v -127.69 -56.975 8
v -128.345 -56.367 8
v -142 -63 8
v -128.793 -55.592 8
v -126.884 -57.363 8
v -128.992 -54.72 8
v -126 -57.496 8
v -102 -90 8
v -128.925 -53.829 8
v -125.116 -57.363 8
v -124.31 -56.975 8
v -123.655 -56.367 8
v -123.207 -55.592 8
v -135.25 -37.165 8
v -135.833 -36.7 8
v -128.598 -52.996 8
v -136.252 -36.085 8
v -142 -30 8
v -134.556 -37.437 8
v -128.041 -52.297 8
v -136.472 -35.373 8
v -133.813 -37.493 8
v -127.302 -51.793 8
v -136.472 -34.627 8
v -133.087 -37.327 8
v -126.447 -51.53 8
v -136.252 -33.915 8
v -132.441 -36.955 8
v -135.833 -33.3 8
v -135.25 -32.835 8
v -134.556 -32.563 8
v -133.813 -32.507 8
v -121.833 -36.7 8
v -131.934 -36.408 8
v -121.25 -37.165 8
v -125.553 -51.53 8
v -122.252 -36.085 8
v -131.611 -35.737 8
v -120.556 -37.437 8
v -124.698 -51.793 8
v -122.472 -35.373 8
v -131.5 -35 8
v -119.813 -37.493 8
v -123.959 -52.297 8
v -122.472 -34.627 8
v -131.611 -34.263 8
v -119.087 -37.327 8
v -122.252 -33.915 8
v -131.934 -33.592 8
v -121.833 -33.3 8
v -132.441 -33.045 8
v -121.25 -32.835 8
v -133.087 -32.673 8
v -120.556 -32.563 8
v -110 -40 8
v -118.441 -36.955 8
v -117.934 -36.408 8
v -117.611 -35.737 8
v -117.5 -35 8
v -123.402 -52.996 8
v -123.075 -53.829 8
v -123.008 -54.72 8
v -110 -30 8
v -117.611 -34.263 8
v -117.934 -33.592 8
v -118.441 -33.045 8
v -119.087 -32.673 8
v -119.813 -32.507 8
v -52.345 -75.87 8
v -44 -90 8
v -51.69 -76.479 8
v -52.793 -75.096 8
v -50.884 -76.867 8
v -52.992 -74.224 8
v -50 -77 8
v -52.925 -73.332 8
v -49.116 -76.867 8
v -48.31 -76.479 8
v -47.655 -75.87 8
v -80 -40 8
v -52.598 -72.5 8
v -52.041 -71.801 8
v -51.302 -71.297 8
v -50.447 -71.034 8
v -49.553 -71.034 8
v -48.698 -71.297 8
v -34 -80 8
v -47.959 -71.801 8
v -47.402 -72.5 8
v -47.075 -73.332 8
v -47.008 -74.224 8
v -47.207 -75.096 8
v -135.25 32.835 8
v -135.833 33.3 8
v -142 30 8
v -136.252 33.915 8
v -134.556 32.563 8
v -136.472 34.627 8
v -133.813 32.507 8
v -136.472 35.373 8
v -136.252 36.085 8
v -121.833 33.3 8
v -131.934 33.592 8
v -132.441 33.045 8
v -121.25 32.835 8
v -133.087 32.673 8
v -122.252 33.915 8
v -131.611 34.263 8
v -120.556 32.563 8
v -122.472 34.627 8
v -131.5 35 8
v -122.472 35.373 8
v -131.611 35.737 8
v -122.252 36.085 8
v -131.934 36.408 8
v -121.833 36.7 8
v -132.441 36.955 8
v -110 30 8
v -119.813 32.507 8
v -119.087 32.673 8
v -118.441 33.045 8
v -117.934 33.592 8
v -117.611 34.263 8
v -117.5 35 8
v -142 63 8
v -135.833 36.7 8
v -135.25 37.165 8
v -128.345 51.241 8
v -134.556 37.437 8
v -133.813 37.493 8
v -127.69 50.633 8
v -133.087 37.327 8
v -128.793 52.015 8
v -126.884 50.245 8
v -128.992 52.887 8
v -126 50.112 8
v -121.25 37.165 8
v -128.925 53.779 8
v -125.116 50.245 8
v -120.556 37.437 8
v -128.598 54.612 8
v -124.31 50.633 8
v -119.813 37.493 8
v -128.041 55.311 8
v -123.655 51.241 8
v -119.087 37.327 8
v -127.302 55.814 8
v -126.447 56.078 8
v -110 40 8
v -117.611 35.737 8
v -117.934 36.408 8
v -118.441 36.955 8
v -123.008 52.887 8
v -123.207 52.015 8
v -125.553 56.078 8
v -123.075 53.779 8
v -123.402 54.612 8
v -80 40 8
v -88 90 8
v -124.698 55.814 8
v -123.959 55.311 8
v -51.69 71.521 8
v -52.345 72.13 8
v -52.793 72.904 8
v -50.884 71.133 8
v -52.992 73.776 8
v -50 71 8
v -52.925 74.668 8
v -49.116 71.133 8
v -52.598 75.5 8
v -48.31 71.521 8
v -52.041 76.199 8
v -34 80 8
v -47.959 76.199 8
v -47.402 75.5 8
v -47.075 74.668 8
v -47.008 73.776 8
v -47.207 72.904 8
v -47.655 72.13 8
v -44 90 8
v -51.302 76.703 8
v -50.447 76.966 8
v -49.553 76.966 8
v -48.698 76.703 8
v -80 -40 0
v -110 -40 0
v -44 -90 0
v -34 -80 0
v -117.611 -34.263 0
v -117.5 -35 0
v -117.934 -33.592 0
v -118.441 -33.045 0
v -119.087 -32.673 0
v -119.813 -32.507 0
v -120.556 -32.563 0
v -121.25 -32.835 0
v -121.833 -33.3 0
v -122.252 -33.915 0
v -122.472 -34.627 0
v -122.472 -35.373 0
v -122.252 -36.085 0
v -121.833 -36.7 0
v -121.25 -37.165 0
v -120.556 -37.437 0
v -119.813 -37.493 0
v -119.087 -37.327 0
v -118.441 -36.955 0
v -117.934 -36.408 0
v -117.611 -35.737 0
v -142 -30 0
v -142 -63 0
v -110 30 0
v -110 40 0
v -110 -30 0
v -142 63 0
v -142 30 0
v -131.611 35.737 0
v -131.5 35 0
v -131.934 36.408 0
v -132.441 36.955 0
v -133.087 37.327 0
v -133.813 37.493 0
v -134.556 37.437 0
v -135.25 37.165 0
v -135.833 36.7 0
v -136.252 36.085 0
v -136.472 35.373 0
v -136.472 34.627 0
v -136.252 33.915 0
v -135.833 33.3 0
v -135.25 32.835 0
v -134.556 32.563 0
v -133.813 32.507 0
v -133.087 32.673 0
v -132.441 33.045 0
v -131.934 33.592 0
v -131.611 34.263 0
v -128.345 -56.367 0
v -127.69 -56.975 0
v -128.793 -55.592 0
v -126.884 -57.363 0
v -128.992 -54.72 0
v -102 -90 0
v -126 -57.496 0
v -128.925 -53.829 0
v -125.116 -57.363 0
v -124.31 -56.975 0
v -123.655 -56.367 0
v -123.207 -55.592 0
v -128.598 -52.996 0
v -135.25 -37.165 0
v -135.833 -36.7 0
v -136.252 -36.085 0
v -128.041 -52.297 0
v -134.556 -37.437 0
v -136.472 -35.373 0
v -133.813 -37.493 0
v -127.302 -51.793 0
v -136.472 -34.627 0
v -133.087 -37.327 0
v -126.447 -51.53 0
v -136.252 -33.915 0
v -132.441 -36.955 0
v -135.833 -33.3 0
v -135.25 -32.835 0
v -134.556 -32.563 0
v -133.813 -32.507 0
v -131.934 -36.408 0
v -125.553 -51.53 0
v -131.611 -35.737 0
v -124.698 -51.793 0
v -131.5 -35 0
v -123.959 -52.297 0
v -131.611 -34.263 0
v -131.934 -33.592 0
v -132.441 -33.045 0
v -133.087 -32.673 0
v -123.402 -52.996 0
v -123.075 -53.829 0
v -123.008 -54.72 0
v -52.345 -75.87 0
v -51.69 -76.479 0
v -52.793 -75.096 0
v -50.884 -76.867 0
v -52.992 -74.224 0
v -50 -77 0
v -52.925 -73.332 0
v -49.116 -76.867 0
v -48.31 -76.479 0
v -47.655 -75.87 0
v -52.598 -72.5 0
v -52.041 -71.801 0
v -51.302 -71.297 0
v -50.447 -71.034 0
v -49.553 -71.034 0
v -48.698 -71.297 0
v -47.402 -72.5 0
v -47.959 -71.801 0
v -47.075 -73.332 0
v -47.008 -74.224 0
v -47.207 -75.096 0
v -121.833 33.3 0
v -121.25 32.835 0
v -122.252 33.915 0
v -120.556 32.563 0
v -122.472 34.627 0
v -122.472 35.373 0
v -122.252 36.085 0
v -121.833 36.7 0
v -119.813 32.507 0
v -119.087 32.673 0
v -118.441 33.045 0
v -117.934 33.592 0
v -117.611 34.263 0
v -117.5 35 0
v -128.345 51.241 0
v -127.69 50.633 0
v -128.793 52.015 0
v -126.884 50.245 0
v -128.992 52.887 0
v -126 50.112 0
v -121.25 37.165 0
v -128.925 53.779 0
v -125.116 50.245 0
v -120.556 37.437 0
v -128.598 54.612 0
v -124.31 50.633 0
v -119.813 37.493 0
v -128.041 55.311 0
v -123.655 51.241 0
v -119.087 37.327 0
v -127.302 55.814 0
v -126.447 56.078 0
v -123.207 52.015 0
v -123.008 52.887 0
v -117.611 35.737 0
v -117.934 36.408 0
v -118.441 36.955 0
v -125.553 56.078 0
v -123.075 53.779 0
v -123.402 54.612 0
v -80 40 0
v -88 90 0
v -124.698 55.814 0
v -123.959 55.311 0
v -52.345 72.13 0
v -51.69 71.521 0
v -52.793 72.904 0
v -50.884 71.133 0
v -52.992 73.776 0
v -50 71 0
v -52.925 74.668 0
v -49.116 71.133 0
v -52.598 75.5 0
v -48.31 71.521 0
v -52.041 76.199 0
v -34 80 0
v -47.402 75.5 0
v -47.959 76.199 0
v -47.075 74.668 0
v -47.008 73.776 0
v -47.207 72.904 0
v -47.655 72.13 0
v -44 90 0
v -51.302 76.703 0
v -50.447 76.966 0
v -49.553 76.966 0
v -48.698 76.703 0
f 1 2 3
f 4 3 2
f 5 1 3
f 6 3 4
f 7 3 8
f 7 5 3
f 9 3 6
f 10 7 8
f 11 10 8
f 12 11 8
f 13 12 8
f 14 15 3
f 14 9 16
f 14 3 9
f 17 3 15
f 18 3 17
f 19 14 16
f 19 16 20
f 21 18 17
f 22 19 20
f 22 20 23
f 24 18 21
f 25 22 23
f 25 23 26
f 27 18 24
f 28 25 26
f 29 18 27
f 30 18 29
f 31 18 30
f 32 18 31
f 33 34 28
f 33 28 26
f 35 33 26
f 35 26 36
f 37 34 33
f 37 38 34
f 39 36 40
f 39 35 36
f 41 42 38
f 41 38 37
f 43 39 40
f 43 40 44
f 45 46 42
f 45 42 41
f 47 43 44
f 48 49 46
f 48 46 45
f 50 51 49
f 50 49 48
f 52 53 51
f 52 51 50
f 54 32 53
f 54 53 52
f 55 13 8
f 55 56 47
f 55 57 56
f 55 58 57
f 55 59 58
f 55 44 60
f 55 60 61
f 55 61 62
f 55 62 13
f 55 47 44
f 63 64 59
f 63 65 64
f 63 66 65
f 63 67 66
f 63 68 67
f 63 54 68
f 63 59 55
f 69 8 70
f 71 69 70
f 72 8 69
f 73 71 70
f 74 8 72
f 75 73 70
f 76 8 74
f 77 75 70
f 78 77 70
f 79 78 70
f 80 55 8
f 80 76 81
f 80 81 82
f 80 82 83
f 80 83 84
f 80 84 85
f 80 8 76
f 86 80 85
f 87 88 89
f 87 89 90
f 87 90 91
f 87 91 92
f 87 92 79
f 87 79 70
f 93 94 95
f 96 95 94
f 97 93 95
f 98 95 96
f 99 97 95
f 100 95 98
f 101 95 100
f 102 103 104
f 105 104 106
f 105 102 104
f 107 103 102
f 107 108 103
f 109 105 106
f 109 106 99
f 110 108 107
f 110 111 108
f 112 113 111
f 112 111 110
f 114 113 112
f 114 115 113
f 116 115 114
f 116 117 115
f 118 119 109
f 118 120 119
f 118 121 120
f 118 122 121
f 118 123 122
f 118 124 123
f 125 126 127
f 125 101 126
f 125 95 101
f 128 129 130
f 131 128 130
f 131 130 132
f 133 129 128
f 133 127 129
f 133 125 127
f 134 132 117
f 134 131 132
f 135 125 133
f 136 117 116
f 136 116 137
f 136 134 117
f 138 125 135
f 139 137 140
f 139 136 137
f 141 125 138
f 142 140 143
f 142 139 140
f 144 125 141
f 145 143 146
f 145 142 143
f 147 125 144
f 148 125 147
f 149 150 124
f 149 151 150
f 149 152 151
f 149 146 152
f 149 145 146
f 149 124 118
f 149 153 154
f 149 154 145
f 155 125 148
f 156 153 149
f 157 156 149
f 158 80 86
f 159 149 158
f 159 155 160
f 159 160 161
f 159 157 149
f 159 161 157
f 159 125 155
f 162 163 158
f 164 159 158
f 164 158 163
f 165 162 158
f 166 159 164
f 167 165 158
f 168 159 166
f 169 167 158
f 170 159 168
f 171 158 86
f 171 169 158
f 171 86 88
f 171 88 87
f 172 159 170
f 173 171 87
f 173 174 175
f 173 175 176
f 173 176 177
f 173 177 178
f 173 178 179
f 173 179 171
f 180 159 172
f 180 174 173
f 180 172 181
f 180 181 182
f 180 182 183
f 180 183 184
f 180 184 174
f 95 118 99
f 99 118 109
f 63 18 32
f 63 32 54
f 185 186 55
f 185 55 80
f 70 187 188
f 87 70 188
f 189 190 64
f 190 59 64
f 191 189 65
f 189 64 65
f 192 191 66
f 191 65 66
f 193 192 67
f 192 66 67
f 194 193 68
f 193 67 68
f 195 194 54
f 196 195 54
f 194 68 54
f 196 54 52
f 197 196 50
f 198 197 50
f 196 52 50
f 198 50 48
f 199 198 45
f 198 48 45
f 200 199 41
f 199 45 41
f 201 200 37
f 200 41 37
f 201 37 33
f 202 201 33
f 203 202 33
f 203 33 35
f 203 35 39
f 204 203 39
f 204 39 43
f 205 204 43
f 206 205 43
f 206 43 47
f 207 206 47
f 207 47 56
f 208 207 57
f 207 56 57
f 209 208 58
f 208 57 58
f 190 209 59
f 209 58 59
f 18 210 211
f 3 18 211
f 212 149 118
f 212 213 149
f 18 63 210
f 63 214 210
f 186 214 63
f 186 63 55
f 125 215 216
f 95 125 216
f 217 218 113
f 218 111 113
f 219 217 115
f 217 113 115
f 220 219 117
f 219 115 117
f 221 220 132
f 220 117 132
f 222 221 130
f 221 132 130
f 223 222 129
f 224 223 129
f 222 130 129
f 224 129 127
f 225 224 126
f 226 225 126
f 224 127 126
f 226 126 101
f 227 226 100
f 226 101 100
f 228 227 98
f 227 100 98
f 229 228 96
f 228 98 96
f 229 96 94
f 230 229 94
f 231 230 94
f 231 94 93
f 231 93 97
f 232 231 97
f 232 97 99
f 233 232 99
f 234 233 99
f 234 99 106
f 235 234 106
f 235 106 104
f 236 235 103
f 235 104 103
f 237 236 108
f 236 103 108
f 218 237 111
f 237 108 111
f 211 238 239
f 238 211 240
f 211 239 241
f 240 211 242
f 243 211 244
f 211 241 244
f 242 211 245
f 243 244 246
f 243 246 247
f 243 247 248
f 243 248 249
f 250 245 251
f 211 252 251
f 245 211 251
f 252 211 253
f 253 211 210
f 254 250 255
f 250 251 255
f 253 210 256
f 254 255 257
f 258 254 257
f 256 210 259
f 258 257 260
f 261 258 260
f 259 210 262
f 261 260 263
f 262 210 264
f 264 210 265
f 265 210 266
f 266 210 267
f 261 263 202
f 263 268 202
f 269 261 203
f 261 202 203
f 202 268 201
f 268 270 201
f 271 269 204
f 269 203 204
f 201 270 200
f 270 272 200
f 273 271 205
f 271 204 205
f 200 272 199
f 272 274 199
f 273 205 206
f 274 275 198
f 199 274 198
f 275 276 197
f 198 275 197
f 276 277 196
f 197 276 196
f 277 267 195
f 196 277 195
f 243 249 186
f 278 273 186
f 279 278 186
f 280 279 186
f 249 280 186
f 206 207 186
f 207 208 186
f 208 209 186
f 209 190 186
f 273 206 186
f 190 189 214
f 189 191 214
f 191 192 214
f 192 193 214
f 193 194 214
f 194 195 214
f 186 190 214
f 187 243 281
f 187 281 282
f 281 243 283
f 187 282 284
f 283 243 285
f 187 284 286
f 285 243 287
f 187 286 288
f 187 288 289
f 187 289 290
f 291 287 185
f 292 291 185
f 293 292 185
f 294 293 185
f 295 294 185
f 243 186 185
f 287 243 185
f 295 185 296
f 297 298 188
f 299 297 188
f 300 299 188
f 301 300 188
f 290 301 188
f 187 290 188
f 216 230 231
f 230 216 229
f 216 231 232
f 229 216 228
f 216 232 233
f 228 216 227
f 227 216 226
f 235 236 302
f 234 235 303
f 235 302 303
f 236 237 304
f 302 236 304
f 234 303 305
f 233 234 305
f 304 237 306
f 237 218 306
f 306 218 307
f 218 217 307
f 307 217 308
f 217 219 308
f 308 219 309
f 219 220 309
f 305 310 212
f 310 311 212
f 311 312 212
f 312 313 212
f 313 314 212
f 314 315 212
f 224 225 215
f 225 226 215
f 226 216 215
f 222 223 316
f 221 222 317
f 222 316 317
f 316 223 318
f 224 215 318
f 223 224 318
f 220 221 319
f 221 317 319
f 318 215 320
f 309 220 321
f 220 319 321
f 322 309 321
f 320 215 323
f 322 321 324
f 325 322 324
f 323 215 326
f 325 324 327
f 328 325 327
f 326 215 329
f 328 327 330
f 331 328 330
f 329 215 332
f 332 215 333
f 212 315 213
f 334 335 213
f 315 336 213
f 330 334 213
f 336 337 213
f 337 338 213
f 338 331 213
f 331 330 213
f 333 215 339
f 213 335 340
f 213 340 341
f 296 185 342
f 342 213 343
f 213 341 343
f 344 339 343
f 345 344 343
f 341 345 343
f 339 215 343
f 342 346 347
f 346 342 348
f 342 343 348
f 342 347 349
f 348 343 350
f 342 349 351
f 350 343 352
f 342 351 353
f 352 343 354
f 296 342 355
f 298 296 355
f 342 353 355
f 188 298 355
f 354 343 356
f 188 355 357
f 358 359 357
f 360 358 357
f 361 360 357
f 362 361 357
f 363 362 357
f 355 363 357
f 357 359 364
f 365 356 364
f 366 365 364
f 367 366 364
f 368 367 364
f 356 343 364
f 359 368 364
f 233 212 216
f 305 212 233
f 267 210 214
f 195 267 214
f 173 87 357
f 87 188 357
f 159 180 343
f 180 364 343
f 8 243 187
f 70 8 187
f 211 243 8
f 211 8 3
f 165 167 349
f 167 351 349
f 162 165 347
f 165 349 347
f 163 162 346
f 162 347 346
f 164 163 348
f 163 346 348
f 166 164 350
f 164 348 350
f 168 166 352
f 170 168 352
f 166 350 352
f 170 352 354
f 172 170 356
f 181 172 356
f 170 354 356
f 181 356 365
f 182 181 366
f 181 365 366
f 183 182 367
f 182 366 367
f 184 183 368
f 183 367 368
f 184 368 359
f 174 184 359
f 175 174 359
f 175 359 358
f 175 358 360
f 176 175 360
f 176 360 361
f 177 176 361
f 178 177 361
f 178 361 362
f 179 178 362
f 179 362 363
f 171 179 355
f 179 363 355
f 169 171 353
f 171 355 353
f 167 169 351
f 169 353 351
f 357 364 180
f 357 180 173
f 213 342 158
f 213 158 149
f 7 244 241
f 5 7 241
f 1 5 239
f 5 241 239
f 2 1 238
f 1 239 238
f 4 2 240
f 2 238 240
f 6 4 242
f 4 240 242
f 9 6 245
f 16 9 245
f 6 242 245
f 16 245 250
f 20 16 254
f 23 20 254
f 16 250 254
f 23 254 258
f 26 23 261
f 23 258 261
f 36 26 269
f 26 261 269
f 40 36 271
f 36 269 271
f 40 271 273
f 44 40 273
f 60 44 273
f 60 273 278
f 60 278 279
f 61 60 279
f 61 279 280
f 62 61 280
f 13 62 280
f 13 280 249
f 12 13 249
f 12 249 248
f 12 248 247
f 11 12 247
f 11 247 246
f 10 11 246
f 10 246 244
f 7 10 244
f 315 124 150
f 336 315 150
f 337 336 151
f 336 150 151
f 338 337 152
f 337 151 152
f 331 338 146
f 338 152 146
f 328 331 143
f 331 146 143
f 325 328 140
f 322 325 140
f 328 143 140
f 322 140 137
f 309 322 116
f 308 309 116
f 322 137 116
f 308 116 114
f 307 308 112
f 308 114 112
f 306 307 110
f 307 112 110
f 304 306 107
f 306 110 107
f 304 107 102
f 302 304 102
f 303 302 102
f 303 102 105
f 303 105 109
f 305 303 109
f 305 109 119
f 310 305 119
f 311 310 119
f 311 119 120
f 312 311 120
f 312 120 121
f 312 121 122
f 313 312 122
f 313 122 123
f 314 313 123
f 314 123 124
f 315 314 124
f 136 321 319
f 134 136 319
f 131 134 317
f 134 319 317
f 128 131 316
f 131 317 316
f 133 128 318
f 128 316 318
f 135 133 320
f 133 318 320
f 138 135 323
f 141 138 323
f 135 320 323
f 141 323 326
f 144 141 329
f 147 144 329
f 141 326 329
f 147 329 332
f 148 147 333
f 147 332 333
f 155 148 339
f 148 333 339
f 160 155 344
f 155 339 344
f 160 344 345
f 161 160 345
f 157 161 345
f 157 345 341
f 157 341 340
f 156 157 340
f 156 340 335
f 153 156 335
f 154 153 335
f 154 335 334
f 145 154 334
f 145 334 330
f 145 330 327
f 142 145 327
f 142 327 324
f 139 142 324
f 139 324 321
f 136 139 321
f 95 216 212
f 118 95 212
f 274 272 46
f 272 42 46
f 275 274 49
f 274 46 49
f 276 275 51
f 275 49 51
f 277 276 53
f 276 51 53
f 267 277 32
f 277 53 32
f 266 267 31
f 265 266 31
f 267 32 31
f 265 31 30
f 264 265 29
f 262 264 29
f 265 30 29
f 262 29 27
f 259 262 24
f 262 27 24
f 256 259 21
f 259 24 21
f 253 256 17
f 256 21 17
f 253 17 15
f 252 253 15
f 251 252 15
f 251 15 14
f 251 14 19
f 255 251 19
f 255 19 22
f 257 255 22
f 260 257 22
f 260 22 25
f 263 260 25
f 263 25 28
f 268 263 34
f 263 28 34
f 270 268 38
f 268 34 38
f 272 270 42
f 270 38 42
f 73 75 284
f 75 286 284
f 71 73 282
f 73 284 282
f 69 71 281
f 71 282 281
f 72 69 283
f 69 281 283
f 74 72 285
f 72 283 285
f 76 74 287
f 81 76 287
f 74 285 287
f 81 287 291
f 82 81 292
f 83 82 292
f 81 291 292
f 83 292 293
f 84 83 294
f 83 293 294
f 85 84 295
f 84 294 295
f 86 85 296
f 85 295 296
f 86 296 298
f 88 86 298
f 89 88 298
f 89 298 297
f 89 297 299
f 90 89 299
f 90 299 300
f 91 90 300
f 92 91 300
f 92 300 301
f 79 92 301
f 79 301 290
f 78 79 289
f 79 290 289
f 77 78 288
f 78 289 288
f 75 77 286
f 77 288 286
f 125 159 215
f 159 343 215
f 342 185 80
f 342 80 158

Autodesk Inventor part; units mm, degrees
ref_plane "YZ Plane" through (0, 0, 0) normal (1, 0, 0) x (0, 1, 0)
ref_plane "XZ Plane" through (0, 0, 0) normal (0, 1, 0) x (-1, 0, 0)
ref_plane "XY Plane" through (0, 0, 0) normal (0, 0, 1) x (1, 0, 0)
sketch "Esquisse1" plane through (0, 0, 0) normal (0, 0, 1) x (1, 0, 0)
  line L0 (-44, 90) -> (-88, 90)
  line L1 (-102, -90) -> (-44, -90)
  line L2 (-34, -80) -> (-34, 80)
  line L3 (-88, 90) -> (-142, 63)
  line L4 (-102, -90) -> (-142, -63)
  line L5 (-44, 90) -> (-34, 80)
  line L6 (-44, -90) -> (-34, -80)
  line L7 (-80, 40) -> (-110, 40)
  line L8 (-110, -40) -> (-80, -40)
  line L9 (-80, -40) -> (-80, 40)
  line L10 (-142, 30) -> (-110, 30)
  line L11 (-110, -30) -> (-142, -30)
  line L12 (-142, 63) -> (-142, 30)
  line L13 (-142, -30) -> (-142, -63)
  line L14 (-110, 40) -> (-110, 30)
  line L15 (-110, -30) -> (-110, -40)
  line L16 (346.6566, 90) -> (-88, 90)
  point P0 (0, 0)
  point P1 (-34, 90)
  point P2 (-142, -90)
  point P3 (-142, 90)
  point P4 (-34, -90)
  dimension "d10" = 180
  dimension "d15" = 54
  dimension "d16" = 27
  dimension "d17" = 40
  dimension "d18" = 27
  dimension "d19" = 10
  dimension "d20" = 10
  dimension "d21" = 10
  dimension "d22" = 10
  dimension "d23" = 80
  dimension "d25" = 40
  dimension "d26" = 46
  dimension "d28" = 60
  dimension "d29" = 30
  dimension "d53" = 108
  dimension "d55" = 90
  dimension "d56" = 80
  dimension "d75" = 108
  dimension "d76" = 108
  dimension "d77" = 76
  dimension "d79" = 32
  dimension "d97" = 90
extrude "Plaque" add sketch "Esquisse1" along normal blind 8
sketch "Esquisse2" plane through (0, 0, 8) normal (0, 0, 1) x (1, 0, 0)
  line L0 (-80, 40) -> (-80, -40) projected
  line L1 (-80, -40) -> (-110, -40) projected
  line L2 (-110, 30) -> (-110, 40) projected
  line L3 (-110, 40) -> (-80, 40) projected
  line L4 (-88, 90) -> (-142, 63) projected
  line L5 (-142, 63) -> (-142, 30) projected
  line L6 (-142, 30) -> (-110, 30) projected
  line L7 (-110, -30) -> (-142, -30) projected
  line L8 (-142, -30) -> (-142, -63) projected
  line L9 (-142, -63) -> (-102, -90) projected
  line L10 (-102, -90) -> (-44, -90) projected
  line L11 (-44, -90) -> (-34, -80) projected
  line L12 (-34, -80) -> (-34, 80) projected
  line L13 (-34, 80) -> (-44, 90) projected
  line L14 (-44, 90) -> (-88, 90) projected
  circle A0 centre (-120, -35) radius 2.5
  circle A1 centre (-134, -35) radius 2.5
  circle A2 centre (-120, 35) radius 2.5
  circle A3 centre (-134, 35) radius 2.5
  line L15 (-110, -40) -> (-110, -30) projected
  dimension "d33" = 5
  dimension "d34" = 5
  dimension "d35" = 5
  dimension "d36" = 5
  dimension "d38" = 5
  dimension "d39" = 5
  dimension "d40" = 5
  dimension "d41" = 5
  dimension "d42" = 14
  dimension "d43" = 14
  dimension "d80" = 10
  dimension "d81" = 10
  dimension "d82" = 8
extrude "Extrusion2" cut sketch "Esquisse2" against normal up to next contours A0 | A1 | A2 | A3
sketch "Esquisse4" plane through (0, 0, 8) normal (0, 0, 1) x (1, 0, 0)
  circle A0 centre (-120, 35) radius 2.5 projected
  circle A1 centre (-120, -35) radius 2.5 projected
  circle A2 centre (-134, -35) radius 2.5 projected
  circle A3 centre (-134, 35) radius 2.5 projected
  line L0 (-88, 90) -> (-142, 63) projected
  line L1 (-142, 63) -> (-142, 30) projected
  line L2 (-142, 30) -> (-110, 30) projected
  line L3 (-110, 30) -> (-110, 40) projected
  line L4 (-110, 40) -> (-80, 40) projected
  line L5 (-80, 40) -> (-80, -40) projected
  line L6 (-80, -40) -> (-110, -40) projected
  line L7 (-110, -40) -> (-110, -30) projected
  line L8 (-110, -30) -> (-142, -30) projected
  line L9 (-142, -30) -> (-142, -63) projected
  line L10 (-142, -63) -> (-102, -90) projected
  line L11 (-102, -90) -> (-44, -90) projected
  line L12 (-44, -90) -> (-34, -80) projected
  line L13 (-34, -80) -> (-34, 80) projected
  line L14 (-34, 80) -> (-44, 90) projected
  line L15 (-44, 90) -> (-88, 90) projected
  line L16 (-126, 53.1115) -> (-84.2229, 74)
  line L17 (-84.2229, 74) -> (-50, 74)
  line L18 (-50, -74) -> (-97.1054, -74)
  line L19 (-97.1054, -74) -> (-126, -54.4961)
  point P0 (0, 0)
  dimension "d106" = 16
hole "Perçage3" at (-126, 53.1115, 8) at (-50, 74, 8) at (-50, -74, 8) at (-126, -54.4961, 8) direction (0, 0, -1) diameter 6 end through all
equation "\"d20\" = d19"
equation "\"d21\" = d19"
equation "\"d22\" = d21"
properties part number "Support_Roue"
